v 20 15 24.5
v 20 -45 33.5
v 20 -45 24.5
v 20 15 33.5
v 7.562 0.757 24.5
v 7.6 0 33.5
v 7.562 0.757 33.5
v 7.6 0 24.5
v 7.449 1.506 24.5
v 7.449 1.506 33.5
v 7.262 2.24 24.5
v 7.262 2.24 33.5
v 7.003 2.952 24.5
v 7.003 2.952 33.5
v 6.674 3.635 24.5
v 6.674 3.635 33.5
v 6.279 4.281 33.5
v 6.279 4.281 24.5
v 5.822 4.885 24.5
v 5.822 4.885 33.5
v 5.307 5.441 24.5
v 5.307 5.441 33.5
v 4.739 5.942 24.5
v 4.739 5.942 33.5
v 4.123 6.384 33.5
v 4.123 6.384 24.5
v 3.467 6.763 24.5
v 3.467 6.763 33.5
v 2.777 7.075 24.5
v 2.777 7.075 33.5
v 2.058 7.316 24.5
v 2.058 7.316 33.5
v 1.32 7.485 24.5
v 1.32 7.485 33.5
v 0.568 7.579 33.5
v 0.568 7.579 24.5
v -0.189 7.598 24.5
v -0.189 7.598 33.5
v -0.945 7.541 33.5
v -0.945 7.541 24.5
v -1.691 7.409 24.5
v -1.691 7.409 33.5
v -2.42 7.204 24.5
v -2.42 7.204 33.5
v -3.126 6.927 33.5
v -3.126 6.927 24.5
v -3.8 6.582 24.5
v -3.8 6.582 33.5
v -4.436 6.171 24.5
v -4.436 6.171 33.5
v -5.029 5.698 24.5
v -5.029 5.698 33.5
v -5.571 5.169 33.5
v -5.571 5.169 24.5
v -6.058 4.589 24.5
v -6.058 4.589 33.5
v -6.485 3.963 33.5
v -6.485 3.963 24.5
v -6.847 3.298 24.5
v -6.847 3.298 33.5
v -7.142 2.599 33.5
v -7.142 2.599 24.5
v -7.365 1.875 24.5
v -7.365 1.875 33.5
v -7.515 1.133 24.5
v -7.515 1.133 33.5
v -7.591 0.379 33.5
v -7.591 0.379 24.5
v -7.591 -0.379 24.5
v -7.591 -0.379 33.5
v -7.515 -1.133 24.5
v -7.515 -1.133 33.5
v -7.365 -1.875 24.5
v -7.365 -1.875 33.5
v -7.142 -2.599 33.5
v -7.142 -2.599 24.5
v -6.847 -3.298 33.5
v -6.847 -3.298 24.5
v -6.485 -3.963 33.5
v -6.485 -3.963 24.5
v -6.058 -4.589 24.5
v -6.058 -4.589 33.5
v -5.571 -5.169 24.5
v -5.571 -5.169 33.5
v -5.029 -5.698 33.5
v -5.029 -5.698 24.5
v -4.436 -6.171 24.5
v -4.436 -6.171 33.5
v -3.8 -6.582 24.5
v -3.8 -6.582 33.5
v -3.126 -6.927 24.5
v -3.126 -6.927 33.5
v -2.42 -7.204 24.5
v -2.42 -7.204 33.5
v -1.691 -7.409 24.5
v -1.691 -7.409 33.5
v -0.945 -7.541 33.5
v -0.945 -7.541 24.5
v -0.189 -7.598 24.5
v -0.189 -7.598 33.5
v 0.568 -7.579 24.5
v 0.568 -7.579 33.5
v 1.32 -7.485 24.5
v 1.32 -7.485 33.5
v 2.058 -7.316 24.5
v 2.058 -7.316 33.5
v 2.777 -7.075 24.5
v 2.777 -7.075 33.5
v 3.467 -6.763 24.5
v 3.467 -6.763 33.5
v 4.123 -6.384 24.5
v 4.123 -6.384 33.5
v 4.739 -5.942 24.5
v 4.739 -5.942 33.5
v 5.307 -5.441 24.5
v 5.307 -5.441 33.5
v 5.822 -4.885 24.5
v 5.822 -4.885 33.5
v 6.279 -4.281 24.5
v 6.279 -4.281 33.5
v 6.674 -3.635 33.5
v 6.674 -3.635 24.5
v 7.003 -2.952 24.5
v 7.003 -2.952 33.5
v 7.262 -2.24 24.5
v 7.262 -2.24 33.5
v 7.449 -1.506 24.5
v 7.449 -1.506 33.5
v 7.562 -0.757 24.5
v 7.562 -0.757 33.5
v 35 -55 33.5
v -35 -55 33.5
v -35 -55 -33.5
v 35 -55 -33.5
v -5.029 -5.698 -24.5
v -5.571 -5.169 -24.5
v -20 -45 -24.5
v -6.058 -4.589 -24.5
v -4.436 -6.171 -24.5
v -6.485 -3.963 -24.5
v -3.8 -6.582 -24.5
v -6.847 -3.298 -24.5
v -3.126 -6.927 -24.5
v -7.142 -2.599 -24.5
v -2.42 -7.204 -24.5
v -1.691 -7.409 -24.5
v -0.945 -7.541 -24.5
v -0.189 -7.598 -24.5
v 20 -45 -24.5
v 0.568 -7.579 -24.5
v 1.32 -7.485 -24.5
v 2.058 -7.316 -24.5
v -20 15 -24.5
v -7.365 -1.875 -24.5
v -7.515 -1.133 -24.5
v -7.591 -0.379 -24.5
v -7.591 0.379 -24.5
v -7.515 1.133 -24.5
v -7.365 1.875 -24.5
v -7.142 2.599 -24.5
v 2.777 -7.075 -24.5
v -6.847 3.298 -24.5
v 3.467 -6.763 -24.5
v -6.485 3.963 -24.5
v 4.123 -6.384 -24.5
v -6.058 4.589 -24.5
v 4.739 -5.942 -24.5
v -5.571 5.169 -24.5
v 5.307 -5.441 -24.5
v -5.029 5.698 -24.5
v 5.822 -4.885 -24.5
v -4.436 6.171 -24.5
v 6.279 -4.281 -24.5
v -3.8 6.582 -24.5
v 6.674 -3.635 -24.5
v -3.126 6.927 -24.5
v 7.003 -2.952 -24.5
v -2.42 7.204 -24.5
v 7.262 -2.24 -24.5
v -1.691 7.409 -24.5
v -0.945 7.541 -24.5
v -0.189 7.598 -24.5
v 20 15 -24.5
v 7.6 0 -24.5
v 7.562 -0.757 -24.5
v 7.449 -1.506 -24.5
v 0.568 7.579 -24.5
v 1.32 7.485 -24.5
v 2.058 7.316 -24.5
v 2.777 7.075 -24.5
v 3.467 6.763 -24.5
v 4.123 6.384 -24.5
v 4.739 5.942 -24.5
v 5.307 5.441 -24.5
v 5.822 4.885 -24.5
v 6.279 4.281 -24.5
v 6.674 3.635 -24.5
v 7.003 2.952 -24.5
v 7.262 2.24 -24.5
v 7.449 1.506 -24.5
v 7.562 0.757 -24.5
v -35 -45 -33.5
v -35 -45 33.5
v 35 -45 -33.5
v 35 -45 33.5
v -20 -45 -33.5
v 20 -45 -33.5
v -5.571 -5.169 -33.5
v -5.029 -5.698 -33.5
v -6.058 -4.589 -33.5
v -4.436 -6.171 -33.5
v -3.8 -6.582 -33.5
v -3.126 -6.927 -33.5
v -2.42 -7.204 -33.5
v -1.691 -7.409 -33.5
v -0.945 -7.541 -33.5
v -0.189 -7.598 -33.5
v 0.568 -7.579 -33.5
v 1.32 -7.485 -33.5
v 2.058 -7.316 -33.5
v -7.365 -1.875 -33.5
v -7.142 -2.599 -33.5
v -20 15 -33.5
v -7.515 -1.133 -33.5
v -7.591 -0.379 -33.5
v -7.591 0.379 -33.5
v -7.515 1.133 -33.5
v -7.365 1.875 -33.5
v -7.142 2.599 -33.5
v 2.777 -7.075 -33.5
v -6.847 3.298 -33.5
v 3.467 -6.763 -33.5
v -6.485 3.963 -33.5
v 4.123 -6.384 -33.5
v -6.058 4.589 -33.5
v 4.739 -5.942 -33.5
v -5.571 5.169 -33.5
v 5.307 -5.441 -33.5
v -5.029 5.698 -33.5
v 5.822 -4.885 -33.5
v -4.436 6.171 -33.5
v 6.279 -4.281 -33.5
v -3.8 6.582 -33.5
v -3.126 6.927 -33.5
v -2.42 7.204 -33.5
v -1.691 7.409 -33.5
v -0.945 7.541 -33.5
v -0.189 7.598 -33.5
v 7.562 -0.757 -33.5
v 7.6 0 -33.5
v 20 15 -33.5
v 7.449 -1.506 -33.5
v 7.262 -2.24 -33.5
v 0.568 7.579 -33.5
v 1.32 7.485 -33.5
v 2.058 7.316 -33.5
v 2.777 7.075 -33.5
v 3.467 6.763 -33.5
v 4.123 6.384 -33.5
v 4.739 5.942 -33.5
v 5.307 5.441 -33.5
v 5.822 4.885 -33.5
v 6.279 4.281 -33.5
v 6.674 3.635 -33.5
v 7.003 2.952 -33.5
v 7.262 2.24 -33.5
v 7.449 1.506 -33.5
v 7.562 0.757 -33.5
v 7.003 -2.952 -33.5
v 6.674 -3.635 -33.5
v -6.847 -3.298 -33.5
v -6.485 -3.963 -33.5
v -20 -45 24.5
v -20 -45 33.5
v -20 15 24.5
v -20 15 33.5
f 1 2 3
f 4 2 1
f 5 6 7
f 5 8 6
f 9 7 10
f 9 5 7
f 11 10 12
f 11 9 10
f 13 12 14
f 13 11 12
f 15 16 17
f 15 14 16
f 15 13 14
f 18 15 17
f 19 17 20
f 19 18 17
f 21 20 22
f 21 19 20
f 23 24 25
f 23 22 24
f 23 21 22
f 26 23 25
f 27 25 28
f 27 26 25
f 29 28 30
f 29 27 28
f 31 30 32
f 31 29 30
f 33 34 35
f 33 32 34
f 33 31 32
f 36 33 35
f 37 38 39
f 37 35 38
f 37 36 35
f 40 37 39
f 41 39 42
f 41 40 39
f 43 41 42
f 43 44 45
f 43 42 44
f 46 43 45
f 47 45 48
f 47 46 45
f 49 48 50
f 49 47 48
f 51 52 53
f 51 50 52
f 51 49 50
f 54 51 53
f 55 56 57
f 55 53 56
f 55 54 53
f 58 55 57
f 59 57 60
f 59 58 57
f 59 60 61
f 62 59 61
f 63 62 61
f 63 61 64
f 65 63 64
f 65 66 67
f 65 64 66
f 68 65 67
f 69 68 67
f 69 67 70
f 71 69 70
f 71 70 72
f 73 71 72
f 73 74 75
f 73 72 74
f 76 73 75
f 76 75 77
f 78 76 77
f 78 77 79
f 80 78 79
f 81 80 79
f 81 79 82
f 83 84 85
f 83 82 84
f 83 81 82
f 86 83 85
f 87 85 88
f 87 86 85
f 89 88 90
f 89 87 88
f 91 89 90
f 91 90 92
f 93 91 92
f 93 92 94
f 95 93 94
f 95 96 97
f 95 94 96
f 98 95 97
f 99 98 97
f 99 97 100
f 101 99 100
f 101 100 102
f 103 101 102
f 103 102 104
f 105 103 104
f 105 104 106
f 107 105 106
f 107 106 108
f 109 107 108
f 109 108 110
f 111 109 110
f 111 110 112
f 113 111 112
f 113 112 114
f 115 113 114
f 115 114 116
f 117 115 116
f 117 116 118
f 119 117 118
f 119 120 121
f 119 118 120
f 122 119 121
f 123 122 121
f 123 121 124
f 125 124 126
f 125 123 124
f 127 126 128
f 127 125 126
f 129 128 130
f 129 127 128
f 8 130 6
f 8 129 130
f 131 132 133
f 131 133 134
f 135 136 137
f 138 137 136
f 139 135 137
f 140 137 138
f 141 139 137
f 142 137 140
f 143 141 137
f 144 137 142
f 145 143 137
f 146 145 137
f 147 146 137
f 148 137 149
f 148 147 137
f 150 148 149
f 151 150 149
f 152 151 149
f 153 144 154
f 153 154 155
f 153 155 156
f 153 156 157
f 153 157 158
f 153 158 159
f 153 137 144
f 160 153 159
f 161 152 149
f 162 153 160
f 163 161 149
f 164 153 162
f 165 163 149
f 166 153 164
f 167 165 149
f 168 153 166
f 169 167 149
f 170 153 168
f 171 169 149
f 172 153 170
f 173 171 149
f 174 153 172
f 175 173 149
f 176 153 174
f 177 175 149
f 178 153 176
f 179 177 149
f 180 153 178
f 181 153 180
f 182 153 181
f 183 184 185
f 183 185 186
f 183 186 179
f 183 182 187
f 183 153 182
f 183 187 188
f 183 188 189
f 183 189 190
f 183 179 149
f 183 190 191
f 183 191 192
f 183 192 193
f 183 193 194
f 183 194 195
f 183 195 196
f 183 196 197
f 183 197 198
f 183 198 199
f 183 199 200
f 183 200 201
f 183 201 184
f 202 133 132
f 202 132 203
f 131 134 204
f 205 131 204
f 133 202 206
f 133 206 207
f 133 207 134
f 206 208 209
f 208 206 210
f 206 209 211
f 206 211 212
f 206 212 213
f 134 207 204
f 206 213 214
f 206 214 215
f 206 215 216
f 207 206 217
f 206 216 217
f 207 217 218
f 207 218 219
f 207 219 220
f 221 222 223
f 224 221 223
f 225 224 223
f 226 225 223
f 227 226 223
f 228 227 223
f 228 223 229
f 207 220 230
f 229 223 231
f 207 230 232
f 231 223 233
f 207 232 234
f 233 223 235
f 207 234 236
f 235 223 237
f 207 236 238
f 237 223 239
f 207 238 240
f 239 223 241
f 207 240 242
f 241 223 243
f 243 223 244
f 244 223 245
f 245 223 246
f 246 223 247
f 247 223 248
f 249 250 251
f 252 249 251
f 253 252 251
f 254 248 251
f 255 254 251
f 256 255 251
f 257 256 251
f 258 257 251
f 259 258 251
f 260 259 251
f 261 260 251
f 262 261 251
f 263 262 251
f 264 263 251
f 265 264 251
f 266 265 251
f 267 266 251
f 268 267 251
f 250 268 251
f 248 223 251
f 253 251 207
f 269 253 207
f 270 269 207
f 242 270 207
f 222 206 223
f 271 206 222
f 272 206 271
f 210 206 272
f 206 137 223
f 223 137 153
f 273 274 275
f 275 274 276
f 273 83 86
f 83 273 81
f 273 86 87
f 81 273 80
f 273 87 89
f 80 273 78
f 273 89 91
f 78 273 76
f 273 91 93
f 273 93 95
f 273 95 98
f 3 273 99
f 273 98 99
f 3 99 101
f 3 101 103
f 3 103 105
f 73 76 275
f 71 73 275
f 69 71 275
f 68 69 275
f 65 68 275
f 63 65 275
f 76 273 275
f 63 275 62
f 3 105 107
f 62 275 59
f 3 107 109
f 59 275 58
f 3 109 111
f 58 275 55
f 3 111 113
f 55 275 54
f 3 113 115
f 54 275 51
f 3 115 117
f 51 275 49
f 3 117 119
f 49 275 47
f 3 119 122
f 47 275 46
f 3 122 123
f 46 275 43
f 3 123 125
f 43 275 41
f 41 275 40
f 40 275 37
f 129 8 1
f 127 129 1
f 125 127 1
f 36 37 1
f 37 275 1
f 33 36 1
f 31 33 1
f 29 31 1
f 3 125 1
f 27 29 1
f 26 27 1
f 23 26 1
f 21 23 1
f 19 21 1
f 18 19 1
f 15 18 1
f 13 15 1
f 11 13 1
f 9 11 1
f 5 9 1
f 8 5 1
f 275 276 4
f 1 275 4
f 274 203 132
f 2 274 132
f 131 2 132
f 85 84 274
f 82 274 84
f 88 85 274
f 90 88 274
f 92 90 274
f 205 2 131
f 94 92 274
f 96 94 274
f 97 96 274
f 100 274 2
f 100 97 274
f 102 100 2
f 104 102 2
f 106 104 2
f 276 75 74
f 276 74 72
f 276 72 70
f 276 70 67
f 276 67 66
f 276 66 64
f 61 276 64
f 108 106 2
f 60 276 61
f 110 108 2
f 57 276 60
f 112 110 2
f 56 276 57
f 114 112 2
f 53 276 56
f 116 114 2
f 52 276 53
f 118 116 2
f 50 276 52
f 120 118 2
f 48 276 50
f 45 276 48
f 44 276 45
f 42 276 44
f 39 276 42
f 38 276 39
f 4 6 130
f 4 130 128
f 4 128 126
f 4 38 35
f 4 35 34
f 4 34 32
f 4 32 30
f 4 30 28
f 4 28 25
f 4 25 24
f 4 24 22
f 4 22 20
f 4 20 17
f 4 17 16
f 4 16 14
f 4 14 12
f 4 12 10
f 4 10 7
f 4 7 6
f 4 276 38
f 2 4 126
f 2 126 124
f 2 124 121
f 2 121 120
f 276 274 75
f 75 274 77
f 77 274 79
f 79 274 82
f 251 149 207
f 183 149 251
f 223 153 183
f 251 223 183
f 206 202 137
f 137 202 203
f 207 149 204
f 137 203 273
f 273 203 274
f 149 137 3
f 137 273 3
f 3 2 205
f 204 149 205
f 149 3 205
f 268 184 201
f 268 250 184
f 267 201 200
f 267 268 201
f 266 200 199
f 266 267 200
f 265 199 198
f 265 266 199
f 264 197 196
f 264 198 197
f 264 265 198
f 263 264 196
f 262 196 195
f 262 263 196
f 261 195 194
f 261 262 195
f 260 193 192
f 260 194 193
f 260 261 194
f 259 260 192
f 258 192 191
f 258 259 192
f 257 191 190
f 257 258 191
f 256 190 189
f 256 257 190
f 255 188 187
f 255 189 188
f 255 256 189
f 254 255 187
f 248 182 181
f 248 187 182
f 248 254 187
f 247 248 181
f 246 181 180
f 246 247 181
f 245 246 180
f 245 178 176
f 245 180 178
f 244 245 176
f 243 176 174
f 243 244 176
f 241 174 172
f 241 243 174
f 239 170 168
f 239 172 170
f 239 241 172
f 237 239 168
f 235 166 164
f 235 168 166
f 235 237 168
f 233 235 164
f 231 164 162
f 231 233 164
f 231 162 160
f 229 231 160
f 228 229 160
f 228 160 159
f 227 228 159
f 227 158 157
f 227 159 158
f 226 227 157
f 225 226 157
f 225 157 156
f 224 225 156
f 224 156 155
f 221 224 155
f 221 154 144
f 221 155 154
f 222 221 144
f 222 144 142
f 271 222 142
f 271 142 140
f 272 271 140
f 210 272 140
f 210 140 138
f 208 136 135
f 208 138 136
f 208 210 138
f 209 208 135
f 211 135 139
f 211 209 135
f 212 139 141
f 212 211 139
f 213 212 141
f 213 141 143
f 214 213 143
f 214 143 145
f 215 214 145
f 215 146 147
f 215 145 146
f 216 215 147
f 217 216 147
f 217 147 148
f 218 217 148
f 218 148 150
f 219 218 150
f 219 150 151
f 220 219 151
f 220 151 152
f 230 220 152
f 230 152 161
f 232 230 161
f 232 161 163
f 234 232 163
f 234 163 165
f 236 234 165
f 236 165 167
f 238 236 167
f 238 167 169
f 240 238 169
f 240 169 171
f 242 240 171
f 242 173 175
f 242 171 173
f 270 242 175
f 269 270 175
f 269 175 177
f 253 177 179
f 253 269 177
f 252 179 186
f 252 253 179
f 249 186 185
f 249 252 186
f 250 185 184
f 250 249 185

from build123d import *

# Parameters (mm, degrees)
SKETCH2_W               = 70
SKETCH2_H               = 10
BOSS_EXTRUDE1_DEPTH     = 33.5
SKETCH3_W               = 40
SKETCH3_H               = 60
BOSS_EXTRUDE2_DEPTH     = 33.5
SKETCH4_W               = 40
SKETCH4_H               = 60
CUT_EXTRUDE1_DEPTH      = 24.5
CUT_EXTRUDE2_DEPTH      = 74.295634249
CUT_EXTRUDE2_DEPTH_BACK = 74.295634249
SKETCH5_R               = 7.6


with BuildPart() as part:
    # Sketch2 → Boss-Extrude1 (new, symmetric)
    with BuildSketch(Plane.XY):
        with Locations((0, -50)):
            Rectangle(SKETCH2_W, SKETCH2_H)
    extrude(amount=BOSS_EXTRUDE1_DEPTH, both=True)

    # Sketch3 → Boss-Extrude2 (add, symmetric)
    with BuildSketch(Plane.XY):
        with Locations((0, -15)):
            Rectangle(SKETCH3_W, SKETCH3_H)
    extrude(amount=BOSS_EXTRUDE2_DEPTH, both=True)

    # Sketch4 → Cut-Extrude1 (cut, symmetric)
    with BuildSketch(Plane.XY):
        with Locations((0, -15)):
            Rectangle(SKETCH4_W, SKETCH4_H)
    extrude(amount=CUT_EXTRUDE1_DEPTH, both=True, mode=Mode.SUBTRACT)

    # Sketch5 → Cut-Extrude2 (cut, two sides: drawn at the far end of the back side and taken through both)
    with BuildSketch(Plane.XY.offset(-CUT_EXTRUDE2_DEPTH_BACK)):
        Circle(SKETCH5_R)
    extrude(amount=CUT_EXTRUDE2_DEPTH + CUT_EXTRUDE2_DEPTH_BACK, mode=Mode.SUBTRACT)


solid = part.part
